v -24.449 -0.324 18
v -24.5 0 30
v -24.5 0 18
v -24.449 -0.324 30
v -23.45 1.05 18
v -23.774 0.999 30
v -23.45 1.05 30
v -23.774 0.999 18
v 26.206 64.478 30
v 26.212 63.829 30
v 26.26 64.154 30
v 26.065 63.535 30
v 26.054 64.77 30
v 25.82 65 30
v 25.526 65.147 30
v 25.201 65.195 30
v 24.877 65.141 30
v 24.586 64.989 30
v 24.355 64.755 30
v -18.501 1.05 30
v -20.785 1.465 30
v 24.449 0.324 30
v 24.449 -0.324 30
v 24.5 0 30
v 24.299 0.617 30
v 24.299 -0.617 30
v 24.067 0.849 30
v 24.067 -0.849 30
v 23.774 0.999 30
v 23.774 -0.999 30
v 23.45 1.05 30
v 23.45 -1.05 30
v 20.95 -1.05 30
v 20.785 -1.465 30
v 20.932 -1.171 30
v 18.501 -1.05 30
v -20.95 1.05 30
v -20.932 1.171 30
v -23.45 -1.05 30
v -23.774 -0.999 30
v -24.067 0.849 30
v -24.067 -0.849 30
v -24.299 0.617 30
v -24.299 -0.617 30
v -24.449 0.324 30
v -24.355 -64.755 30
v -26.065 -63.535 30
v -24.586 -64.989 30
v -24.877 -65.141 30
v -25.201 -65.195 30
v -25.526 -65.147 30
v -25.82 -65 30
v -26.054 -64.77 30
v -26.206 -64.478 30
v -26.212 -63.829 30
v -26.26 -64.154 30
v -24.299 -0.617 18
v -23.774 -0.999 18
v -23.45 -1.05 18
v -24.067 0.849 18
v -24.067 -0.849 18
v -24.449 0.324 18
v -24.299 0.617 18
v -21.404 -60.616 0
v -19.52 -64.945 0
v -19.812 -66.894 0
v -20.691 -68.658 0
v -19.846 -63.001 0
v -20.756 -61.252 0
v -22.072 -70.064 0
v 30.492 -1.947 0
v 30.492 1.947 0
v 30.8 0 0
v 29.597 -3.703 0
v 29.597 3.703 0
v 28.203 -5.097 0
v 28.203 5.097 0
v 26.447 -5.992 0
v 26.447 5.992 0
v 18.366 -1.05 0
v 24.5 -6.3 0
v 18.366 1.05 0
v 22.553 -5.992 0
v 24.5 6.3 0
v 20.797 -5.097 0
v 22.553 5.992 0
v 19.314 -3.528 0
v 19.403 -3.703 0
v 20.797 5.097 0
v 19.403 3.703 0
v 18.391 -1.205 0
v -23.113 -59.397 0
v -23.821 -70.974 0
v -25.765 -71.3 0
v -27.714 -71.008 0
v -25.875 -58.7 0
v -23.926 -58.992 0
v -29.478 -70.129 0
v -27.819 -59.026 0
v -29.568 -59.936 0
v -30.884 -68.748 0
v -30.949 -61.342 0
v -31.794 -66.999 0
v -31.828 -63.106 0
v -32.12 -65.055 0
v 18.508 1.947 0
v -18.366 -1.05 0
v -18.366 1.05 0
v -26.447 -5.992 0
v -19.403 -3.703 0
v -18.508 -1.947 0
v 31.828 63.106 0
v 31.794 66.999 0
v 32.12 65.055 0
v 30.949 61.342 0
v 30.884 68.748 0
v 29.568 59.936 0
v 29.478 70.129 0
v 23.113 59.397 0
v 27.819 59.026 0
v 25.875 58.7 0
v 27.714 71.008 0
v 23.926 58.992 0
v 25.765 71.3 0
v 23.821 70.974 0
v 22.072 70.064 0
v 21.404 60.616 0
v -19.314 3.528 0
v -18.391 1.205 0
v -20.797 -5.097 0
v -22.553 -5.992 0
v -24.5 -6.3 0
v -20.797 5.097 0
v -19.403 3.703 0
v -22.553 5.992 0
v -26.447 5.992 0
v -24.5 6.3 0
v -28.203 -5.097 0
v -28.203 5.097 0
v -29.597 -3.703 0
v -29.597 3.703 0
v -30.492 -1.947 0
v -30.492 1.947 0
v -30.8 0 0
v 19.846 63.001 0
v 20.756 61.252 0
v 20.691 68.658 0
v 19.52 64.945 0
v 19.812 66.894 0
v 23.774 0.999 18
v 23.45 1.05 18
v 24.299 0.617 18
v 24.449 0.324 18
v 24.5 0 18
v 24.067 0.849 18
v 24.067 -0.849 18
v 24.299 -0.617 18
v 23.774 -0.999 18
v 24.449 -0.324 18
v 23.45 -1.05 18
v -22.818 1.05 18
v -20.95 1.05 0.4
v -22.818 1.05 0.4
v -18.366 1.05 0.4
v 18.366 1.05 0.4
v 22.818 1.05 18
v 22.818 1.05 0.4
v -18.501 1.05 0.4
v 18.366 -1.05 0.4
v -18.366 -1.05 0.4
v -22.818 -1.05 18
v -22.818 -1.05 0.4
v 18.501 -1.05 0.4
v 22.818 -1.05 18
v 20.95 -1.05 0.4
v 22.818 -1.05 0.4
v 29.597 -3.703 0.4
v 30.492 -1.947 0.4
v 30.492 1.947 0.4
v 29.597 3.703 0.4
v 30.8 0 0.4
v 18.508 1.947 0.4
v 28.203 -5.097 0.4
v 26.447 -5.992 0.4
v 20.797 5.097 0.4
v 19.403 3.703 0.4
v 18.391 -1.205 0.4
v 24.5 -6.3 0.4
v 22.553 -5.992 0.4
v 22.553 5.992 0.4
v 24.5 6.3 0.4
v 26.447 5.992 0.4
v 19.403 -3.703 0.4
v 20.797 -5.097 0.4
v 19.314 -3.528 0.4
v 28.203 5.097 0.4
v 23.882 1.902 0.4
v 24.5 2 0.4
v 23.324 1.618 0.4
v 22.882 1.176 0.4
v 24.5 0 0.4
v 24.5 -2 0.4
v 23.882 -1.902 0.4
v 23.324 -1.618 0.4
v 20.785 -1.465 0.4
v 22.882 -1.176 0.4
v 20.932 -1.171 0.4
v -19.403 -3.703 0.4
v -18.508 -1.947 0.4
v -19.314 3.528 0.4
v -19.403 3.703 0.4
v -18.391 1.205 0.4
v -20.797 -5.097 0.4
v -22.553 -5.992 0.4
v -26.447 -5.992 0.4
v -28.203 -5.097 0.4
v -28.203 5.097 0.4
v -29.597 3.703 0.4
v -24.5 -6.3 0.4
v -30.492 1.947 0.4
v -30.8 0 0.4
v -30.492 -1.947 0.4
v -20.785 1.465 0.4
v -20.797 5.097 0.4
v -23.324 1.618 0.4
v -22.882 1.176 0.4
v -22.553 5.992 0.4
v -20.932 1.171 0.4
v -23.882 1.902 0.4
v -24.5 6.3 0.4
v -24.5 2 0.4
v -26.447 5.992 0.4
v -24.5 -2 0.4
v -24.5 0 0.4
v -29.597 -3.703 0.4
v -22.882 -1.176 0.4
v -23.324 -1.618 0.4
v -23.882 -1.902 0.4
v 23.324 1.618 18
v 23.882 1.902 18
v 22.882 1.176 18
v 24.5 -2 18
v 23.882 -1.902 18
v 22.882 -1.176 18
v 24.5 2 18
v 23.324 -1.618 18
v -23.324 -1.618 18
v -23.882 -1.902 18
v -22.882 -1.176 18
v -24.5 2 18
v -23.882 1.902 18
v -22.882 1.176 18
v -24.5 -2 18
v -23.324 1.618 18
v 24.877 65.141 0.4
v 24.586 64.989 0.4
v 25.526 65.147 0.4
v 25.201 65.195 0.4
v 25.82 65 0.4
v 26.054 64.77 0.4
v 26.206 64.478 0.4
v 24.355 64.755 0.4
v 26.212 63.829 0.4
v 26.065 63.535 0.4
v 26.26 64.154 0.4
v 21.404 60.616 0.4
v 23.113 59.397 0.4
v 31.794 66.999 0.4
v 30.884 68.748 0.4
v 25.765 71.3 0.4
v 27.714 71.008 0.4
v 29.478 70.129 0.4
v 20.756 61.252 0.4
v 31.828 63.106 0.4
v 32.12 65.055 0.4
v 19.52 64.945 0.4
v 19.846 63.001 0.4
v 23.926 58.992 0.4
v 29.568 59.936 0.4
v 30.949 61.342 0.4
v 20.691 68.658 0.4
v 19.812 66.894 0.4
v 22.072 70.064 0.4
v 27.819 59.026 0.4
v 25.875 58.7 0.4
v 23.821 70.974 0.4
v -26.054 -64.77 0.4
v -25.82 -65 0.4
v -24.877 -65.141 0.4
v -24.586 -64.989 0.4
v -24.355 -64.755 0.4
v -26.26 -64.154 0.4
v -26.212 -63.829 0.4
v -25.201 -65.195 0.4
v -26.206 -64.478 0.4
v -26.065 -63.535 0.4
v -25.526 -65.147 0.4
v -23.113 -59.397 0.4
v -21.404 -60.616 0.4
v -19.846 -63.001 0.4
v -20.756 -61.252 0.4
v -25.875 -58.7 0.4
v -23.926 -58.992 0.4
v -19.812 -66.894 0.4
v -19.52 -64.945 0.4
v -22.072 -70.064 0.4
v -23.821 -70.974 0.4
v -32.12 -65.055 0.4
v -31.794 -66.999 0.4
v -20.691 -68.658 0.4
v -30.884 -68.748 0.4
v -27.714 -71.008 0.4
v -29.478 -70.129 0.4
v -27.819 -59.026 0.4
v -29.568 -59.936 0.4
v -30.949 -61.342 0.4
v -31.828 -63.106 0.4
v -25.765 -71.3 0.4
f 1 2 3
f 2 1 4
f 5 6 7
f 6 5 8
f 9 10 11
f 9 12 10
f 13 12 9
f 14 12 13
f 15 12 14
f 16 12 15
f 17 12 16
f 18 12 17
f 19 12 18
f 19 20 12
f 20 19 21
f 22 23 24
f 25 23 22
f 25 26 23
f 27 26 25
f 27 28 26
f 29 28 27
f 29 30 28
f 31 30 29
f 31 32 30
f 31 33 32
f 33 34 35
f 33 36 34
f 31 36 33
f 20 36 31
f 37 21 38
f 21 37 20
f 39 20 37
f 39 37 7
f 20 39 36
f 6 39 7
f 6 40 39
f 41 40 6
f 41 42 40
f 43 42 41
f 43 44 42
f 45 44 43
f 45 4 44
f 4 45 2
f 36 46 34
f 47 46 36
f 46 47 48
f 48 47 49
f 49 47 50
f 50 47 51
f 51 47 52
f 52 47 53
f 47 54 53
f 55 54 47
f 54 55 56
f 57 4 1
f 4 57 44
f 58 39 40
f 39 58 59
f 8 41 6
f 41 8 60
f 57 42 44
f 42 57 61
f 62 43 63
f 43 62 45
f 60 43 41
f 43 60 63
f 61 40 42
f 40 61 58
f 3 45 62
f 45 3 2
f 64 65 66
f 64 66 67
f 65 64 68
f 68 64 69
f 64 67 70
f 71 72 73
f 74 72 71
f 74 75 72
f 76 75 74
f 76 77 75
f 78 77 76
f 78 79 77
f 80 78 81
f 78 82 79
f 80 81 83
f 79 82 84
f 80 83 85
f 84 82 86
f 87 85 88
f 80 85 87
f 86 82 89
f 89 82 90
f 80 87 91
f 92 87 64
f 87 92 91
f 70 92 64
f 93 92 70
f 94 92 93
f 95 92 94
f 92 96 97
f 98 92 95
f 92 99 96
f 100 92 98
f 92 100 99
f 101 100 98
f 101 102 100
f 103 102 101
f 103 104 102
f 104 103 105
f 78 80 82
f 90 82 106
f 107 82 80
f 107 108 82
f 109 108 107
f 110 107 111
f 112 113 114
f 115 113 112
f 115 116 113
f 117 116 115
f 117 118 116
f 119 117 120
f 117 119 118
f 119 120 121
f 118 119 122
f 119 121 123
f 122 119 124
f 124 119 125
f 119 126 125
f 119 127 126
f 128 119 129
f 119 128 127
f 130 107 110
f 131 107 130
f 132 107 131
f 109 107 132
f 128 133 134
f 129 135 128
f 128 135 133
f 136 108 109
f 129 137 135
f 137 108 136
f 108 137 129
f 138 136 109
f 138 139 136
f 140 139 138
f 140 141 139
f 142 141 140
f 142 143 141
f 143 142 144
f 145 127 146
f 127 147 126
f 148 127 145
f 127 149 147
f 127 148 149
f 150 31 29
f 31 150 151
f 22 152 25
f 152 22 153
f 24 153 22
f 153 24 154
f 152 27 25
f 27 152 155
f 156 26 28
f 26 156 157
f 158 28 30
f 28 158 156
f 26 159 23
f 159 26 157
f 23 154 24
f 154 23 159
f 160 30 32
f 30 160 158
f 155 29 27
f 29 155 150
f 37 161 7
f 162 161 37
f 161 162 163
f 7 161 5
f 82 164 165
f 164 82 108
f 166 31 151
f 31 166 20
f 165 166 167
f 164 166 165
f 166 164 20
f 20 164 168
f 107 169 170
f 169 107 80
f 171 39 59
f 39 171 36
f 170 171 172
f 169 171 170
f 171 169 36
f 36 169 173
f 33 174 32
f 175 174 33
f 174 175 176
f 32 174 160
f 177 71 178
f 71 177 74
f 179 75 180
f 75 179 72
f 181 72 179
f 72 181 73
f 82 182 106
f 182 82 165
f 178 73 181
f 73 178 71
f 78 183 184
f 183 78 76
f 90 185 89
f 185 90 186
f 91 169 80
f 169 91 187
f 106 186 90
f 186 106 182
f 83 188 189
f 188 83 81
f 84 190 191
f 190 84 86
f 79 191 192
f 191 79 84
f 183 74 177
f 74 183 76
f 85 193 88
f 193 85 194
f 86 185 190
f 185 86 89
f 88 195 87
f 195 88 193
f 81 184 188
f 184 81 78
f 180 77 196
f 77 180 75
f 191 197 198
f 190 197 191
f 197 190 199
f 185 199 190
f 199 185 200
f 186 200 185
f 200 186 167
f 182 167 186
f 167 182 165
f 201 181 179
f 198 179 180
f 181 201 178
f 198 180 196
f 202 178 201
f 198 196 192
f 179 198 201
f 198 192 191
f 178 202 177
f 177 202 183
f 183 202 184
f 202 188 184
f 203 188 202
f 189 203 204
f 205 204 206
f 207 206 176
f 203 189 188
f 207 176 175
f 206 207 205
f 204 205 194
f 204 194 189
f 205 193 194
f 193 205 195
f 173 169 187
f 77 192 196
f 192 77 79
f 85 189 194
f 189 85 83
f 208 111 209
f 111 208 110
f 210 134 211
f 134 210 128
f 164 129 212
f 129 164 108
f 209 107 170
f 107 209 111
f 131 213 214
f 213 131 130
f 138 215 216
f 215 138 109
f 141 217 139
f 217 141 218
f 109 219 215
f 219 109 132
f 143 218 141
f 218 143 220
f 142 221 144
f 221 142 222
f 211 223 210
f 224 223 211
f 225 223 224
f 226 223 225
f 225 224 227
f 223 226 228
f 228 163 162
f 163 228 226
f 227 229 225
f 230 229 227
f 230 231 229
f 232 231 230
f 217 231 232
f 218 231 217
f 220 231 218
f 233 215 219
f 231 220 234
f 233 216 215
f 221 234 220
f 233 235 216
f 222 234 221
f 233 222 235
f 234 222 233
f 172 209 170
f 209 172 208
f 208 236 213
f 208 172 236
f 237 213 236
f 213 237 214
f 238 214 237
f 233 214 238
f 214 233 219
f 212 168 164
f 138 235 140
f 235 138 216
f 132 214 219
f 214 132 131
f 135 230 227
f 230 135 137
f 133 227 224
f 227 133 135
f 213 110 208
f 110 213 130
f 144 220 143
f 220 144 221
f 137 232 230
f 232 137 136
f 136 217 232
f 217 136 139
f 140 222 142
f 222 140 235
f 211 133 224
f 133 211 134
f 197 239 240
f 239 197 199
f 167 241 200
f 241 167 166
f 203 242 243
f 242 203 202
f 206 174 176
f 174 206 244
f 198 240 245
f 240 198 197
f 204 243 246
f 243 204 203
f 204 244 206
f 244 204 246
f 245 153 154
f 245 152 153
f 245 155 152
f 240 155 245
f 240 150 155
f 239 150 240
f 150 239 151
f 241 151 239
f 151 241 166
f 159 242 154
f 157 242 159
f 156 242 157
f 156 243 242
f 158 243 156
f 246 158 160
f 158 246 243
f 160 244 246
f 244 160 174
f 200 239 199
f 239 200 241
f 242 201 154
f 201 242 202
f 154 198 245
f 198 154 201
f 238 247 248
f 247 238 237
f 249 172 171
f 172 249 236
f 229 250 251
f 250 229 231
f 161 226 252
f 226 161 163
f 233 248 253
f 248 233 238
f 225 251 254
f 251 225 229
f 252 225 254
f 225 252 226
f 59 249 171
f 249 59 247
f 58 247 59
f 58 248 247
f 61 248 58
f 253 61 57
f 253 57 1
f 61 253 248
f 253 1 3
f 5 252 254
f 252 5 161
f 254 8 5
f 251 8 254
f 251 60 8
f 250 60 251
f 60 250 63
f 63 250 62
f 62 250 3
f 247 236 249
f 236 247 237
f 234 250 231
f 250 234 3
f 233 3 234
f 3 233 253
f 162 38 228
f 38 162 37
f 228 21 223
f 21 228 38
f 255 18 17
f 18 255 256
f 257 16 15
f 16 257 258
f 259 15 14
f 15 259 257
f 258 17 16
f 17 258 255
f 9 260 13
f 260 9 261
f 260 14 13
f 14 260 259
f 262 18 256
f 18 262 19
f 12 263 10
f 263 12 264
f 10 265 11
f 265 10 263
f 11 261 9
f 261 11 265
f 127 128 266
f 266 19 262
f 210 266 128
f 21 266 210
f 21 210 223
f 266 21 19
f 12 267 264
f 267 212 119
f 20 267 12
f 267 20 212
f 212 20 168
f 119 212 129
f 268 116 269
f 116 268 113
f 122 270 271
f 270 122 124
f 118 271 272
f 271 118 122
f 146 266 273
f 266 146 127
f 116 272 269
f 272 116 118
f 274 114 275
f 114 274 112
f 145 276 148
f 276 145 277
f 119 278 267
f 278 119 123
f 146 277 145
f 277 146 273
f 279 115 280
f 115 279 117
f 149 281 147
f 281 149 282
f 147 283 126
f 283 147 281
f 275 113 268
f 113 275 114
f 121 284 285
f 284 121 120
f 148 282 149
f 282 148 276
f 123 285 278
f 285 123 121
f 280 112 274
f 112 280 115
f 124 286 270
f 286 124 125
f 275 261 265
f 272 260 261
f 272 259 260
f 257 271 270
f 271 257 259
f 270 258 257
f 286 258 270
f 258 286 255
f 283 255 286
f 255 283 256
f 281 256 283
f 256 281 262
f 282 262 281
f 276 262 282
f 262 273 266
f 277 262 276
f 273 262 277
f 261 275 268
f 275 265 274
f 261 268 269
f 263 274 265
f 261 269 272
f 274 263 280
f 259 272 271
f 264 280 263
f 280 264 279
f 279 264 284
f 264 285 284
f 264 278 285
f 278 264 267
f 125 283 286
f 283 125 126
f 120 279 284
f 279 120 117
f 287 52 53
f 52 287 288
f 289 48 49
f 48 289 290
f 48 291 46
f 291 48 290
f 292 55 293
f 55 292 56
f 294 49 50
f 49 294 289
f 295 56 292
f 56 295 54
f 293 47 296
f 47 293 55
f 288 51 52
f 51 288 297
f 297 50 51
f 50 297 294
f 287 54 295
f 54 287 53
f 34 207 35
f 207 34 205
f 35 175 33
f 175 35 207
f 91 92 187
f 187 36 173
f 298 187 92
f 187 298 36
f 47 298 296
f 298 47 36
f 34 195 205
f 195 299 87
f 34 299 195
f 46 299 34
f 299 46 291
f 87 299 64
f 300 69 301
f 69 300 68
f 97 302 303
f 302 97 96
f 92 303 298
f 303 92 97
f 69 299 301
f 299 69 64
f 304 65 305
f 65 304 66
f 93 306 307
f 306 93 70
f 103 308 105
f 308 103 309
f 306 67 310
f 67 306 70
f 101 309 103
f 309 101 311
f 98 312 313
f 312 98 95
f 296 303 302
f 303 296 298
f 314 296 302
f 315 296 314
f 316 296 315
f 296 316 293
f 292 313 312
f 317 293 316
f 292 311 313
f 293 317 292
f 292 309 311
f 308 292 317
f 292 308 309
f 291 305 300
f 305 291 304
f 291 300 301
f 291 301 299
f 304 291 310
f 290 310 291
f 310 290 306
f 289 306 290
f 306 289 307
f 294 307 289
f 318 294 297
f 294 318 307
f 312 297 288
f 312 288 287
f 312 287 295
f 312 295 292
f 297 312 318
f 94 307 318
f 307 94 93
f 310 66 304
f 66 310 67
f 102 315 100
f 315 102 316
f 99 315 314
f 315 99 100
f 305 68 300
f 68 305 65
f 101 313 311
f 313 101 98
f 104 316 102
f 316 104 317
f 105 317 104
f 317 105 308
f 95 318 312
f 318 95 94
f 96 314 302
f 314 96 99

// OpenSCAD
// Interior width of the parts bin
binWidth = 49;

// Interior length of the parts bin
binDepth = 130;

// Interior height of the parts bin
binHeight = 30;

// How many partitions?
partitions = 4; // [2, 3, 4]

// Height of the mating portion, 0 for none
wedgeHeight = 18;

// Diameter of the 1/2 circle mating portion
wedgeDiameter = 4;

// Should be a whole multiple of extrusion width
wallThickness = 2.1;

// Twice the layer thickness is recommended, 0 for none
anchorThickness = 0.4;

wall (binWidth, wallThickness, binHeight);
translate ([(binWidth) / 2, 0, 0])
	anchor (wedgeDiameter, wedgeHeight);
rotate([0, 0, 180])
	translate ([(binWidth) / 2, 0, 0])
		anchor (wedgeDiameter, wedgeHeight);

offset = wedgeDiameter * .66;
remainingWidth = binWidth - offset;
partialLength =  sqrt (pow ((binDepth/2), 2) + pow (remainingWidth, 2));
partialAngle = asin (binDepth/2/partialLength);

if (partitions > 2)
{
    translate ([offset, binDepth / 4, 0])
        rotate ([0, 0, partialAngle])
            wall (partialLength, wallThickness, binHeight, true, false);

    if (partitions == 4)
    {
        translate ([-offset, -binDepth / 4, 0])
            rotate ([0, 0, partialAngle])
                wall (partialLength, wallThickness, binHeight, false, true);
    }
}

module wall (length, thickness, height, leftAnchor=true, rightAnchor=true)
{
	union ()
	{
		translate([-(length/2 - thickness/2), -thickness/2, 0])
			cube([length - thickness, thickness, height]);

		for (x=[-1,1])
		{
			translate([x*((length - thickness)/2), 0, 0])
				cylinder(r=thickness/2, h=height, $fn=20);	
		}

		// Integral bed anchors
		if (leftAnchor)
			translate([length/2, 0, 0])
				cylinder(r=thickness*3, h=anchorThickness, $fn=20);	
		if (rightAnchor)
			translate([-length/2, 0, 0])
				cylinder(r=thickness*3, h=anchorThickness, $fn=20);		
	}
}

module anchor (width, height)
{
	difference ()
	{
		cylinder(r=(width / 2), h=height, $fn=20);
		translate([0, -width / 2 -1, -1])
			cube([width, width + 2, height + 2]);
	}
}
